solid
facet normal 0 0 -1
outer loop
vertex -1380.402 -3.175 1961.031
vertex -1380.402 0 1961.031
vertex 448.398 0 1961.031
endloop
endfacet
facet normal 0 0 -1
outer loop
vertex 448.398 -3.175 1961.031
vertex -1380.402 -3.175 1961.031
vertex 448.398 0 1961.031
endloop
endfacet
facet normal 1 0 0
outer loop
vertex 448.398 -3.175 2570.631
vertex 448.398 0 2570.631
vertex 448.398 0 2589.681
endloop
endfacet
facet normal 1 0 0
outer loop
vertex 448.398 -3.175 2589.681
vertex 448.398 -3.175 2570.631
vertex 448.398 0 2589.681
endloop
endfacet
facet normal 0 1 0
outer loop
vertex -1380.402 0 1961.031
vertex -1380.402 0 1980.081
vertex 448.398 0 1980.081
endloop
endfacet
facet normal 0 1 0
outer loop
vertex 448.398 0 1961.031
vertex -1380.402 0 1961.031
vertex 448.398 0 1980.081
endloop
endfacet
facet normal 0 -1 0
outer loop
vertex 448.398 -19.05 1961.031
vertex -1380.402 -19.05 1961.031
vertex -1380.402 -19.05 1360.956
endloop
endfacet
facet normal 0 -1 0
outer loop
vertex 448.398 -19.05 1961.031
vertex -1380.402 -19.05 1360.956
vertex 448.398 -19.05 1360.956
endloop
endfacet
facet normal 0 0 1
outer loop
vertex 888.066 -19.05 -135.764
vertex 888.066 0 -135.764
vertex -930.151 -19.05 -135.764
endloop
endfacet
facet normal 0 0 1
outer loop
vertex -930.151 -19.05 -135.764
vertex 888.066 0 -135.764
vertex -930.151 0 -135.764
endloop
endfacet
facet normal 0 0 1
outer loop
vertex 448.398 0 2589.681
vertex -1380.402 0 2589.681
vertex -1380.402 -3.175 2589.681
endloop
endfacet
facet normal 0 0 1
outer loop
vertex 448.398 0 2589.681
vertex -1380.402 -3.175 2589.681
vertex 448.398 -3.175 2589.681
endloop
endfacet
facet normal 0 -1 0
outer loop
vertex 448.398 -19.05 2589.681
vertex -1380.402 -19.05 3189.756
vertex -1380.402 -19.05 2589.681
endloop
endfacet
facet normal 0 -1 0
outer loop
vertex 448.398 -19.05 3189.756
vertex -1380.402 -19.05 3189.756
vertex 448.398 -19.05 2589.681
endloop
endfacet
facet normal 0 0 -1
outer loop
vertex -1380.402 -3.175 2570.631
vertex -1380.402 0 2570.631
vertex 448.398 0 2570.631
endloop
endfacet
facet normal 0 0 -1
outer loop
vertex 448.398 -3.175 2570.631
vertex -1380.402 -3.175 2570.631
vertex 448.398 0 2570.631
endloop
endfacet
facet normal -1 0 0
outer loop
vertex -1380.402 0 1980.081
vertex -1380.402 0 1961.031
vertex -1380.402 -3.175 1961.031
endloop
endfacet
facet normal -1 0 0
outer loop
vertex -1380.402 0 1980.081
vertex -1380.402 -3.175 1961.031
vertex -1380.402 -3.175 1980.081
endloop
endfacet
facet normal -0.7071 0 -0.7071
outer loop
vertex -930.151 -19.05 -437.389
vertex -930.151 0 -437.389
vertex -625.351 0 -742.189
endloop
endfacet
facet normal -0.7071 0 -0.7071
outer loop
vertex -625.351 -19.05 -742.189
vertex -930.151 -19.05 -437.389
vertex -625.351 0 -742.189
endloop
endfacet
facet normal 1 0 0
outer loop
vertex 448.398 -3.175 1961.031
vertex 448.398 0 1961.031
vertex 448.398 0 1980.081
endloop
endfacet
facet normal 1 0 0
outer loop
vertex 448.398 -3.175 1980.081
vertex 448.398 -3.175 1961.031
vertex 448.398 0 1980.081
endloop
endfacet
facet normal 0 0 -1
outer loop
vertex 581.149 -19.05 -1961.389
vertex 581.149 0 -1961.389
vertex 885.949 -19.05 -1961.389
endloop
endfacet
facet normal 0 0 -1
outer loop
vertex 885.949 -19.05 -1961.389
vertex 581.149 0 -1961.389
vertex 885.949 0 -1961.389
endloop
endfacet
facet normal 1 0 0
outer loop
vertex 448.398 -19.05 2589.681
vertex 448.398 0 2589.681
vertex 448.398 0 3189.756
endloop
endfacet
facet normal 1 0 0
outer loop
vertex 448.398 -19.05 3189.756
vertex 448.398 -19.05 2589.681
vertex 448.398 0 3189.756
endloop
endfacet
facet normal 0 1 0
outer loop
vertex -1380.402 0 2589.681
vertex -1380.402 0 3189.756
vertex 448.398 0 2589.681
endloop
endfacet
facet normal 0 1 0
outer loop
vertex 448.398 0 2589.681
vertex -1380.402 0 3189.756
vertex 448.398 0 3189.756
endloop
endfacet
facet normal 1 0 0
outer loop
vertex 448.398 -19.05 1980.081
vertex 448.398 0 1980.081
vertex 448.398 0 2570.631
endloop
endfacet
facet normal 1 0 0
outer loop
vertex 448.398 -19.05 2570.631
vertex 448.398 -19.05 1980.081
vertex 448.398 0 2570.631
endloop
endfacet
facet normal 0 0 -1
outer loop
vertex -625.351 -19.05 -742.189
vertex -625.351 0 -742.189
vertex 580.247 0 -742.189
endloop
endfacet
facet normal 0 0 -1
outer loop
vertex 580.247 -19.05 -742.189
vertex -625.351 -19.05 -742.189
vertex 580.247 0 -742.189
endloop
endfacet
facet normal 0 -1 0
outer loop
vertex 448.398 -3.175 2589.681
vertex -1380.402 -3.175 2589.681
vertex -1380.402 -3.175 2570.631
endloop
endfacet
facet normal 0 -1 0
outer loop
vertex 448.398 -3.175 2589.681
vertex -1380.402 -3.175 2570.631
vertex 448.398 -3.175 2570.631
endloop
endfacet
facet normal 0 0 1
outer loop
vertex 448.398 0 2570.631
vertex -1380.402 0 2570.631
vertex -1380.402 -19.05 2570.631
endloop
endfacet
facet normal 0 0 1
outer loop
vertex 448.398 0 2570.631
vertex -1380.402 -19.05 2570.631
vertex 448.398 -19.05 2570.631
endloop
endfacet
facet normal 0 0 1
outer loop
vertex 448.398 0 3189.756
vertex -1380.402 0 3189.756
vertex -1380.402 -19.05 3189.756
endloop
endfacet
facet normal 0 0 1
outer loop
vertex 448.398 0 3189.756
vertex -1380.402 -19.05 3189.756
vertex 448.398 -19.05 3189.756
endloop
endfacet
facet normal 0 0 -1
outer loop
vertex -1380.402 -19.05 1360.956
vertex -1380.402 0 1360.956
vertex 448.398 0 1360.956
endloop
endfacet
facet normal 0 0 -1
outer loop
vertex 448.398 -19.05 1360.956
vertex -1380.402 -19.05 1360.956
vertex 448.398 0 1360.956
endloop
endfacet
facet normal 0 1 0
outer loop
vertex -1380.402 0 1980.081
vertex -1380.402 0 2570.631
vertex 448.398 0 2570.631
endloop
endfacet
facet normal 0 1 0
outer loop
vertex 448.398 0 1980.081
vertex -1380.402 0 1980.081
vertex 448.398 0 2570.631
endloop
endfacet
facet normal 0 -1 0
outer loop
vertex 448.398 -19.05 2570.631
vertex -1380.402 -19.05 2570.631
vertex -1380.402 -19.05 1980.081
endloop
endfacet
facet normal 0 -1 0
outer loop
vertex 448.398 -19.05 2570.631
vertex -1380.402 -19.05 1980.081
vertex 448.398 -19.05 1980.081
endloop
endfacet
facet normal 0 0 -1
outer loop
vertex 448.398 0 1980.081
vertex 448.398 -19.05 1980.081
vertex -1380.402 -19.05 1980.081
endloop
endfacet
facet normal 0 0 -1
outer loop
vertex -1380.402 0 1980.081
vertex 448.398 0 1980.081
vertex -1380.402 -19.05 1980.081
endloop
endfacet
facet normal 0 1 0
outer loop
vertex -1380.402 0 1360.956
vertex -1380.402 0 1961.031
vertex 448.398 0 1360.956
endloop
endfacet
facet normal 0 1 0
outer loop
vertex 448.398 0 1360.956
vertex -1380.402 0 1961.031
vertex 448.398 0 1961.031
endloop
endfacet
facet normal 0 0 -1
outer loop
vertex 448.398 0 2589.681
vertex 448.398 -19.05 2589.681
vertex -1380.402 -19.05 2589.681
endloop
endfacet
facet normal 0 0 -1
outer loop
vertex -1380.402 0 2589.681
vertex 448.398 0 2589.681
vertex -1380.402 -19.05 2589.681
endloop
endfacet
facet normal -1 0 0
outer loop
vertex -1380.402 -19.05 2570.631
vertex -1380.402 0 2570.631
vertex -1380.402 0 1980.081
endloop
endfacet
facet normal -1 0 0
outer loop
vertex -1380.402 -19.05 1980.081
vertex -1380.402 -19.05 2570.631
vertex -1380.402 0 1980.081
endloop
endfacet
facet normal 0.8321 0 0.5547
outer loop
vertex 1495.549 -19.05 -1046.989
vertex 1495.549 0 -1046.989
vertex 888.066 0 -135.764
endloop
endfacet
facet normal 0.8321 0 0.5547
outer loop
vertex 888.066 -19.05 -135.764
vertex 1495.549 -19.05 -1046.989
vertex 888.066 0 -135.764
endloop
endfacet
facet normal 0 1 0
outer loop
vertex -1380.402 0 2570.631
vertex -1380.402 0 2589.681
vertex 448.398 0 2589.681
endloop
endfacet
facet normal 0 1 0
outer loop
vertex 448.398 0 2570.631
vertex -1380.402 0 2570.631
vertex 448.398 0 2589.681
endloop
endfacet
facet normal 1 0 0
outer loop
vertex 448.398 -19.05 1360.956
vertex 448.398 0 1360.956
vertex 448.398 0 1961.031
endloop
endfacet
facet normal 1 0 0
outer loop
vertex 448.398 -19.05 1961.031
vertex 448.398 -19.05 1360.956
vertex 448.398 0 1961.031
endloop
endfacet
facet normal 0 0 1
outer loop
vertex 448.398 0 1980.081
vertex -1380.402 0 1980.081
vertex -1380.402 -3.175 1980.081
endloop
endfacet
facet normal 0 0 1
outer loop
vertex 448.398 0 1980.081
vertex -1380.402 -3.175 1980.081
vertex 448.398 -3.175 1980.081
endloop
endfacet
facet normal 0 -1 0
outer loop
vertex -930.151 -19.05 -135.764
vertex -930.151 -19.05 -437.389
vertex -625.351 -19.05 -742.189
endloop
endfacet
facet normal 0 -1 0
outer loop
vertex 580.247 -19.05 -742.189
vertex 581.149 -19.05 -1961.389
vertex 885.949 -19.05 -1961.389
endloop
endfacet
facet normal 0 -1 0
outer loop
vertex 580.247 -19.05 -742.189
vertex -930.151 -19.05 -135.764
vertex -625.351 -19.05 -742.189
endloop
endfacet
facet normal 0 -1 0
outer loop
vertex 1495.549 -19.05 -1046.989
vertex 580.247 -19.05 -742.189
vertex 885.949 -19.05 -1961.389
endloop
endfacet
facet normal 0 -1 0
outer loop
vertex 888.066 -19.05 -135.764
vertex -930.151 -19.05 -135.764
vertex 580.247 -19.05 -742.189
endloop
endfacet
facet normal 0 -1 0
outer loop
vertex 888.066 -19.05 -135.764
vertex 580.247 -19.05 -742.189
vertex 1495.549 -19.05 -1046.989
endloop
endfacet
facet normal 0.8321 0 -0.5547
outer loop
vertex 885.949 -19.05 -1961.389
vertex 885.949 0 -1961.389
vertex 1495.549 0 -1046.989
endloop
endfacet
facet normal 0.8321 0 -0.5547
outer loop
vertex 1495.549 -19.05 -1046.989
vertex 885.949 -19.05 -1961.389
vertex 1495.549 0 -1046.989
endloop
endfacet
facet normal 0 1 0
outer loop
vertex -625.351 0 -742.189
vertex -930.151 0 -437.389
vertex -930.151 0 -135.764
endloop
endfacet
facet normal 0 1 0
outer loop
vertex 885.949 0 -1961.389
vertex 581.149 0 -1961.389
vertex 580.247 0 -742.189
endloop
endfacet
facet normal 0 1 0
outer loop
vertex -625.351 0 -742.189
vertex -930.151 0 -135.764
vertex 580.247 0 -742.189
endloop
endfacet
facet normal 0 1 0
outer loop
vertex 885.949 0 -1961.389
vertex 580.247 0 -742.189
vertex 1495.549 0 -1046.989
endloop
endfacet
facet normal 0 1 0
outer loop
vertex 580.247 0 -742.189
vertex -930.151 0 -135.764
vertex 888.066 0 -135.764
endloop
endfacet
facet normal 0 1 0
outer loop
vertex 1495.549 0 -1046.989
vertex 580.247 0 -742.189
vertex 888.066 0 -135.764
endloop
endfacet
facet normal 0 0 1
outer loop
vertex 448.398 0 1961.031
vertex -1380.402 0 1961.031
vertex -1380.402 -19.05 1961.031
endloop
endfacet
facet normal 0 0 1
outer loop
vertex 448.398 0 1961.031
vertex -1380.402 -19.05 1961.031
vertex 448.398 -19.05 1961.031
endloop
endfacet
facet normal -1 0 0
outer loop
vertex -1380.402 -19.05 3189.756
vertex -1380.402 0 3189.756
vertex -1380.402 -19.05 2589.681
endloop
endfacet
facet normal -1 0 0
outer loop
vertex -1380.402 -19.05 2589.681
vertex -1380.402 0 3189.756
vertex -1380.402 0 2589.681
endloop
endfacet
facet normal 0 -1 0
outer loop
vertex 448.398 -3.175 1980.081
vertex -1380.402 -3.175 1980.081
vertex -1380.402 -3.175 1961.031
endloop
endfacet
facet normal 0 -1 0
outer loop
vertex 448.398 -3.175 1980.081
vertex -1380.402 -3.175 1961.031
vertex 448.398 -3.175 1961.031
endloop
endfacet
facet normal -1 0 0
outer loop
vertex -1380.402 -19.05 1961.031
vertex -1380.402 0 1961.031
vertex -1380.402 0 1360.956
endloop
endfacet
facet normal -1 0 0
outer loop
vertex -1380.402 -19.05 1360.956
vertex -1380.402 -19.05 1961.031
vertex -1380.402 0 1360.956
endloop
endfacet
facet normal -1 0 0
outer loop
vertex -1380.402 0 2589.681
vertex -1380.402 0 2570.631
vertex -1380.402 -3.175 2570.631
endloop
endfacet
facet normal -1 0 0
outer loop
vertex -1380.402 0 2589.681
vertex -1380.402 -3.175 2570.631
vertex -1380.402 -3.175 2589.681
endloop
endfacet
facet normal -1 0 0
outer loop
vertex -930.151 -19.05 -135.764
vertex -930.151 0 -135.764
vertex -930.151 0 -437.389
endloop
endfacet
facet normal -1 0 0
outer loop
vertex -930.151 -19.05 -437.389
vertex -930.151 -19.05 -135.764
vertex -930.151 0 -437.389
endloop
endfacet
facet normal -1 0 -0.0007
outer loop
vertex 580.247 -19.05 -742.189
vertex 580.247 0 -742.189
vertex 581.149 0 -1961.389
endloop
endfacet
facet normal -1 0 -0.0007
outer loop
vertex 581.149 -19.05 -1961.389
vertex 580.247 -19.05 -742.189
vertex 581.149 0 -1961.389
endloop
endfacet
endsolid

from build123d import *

# Parameters (mm, degrees)
F1_DEPTH = 19.05
F2_W     = 1828.8
F2_H     = 600.075
F2_H_2   = 19.05
F2_H_3   = 590.55
F3_DEPTH = 12.7
F4_DEPTH = 19.05
F5_DEPTH = 12.7
F6_DEPTH = 3.175


with BuildPart() as f1:
    # F0 (on Front) → F1 (new body)
    with BuildSketch(Plane.XZ):
        Polygon((-930.1507037908, -437.3889599509), (-625.3507037908, -742.1889599509), (580.2474021912, -742.1889599509), (581.1492962092, -1961.3889599509), (885.9492962092, -1961.3889599509), (1495.5492962092, -1046.9889599509), (888.0659628759, -135.7639599509), (-930.1507037908, -135.7639599509), align=None)
    extrude(amount=F1_DEPTH)


with BuildPart() as f3:
    # F2 (on Front) → F3 (new body)
    with BuildSketch(Plane.XZ):
        with Locations((-466.0015106201, 2889.7185382142)):
            Rectangle(F2_W, F2_H)
        with Locations((-466.0015106201, 2580.1560382142)):
            Rectangle(F2_W, F2_H_2)
        with Locations((-466.0015106201, 2275.3560382142)):
            Rectangle(F2_W, F2_H_3)
        with Locations((-466.0015106201, 1970.5560382142)):
            Rectangle(F2_W, F2_H_2)
        with Locations((-466.0015106201, 1660.9935382142)):
            Rectangle(F2_W, F2_H)
    extrude(amount=F3_DEPTH)

    # F2 (on Front) → F4 (join)
    with BuildSketch(Plane.XZ):
        with Locations((-466.0015106201, 2889.7185382142)):
            Rectangle(F2_W, F2_H)
        with Locations((-466.0015106201, 2275.3560382142)):
            Rectangle(F2_W, F2_H_3)
        with Locations((-466.0015106201, 1660.9935382142)):
            Rectangle(F2_W, F2_H)
    extrude(amount=F4_DEPTH)

    # F5 (cut): faces of the model
    f5_faces = [f3.faces().sort_by_distance(p)[0] for p in [
        (-466.0015106201, -12.7, 2580.1560382142),
        (-466.0015106201, -12.7, 1970.5560382142),
    ]]
    extrude(f5_faces, amount=-F5_DEPTH, mode=Mode.SUBTRACT)


with BuildPart() as f6:
    # F2 (on Front) → F6 (new body)
    with BuildSketch(Plane.XZ):
        with Locations((-466.0015106201, 1970.5560382142)):
            Rectangle(F2_W, F2_H_2)
    extrude(amount=F6_DEPTH)


with BuildPart() as f6b:
    # F2 (on Front) → F6, piece 2 (new body)
    with BuildSketch(Plane.XZ):
        with Locations((-466.0015106201, 2580.1560382142)):
            Rectangle(F2_W, F2_H_2)
    extrude(amount=F6_DEPTH)


solid = Compound([f1.part, f3.part, f6.part, f6b.part])
